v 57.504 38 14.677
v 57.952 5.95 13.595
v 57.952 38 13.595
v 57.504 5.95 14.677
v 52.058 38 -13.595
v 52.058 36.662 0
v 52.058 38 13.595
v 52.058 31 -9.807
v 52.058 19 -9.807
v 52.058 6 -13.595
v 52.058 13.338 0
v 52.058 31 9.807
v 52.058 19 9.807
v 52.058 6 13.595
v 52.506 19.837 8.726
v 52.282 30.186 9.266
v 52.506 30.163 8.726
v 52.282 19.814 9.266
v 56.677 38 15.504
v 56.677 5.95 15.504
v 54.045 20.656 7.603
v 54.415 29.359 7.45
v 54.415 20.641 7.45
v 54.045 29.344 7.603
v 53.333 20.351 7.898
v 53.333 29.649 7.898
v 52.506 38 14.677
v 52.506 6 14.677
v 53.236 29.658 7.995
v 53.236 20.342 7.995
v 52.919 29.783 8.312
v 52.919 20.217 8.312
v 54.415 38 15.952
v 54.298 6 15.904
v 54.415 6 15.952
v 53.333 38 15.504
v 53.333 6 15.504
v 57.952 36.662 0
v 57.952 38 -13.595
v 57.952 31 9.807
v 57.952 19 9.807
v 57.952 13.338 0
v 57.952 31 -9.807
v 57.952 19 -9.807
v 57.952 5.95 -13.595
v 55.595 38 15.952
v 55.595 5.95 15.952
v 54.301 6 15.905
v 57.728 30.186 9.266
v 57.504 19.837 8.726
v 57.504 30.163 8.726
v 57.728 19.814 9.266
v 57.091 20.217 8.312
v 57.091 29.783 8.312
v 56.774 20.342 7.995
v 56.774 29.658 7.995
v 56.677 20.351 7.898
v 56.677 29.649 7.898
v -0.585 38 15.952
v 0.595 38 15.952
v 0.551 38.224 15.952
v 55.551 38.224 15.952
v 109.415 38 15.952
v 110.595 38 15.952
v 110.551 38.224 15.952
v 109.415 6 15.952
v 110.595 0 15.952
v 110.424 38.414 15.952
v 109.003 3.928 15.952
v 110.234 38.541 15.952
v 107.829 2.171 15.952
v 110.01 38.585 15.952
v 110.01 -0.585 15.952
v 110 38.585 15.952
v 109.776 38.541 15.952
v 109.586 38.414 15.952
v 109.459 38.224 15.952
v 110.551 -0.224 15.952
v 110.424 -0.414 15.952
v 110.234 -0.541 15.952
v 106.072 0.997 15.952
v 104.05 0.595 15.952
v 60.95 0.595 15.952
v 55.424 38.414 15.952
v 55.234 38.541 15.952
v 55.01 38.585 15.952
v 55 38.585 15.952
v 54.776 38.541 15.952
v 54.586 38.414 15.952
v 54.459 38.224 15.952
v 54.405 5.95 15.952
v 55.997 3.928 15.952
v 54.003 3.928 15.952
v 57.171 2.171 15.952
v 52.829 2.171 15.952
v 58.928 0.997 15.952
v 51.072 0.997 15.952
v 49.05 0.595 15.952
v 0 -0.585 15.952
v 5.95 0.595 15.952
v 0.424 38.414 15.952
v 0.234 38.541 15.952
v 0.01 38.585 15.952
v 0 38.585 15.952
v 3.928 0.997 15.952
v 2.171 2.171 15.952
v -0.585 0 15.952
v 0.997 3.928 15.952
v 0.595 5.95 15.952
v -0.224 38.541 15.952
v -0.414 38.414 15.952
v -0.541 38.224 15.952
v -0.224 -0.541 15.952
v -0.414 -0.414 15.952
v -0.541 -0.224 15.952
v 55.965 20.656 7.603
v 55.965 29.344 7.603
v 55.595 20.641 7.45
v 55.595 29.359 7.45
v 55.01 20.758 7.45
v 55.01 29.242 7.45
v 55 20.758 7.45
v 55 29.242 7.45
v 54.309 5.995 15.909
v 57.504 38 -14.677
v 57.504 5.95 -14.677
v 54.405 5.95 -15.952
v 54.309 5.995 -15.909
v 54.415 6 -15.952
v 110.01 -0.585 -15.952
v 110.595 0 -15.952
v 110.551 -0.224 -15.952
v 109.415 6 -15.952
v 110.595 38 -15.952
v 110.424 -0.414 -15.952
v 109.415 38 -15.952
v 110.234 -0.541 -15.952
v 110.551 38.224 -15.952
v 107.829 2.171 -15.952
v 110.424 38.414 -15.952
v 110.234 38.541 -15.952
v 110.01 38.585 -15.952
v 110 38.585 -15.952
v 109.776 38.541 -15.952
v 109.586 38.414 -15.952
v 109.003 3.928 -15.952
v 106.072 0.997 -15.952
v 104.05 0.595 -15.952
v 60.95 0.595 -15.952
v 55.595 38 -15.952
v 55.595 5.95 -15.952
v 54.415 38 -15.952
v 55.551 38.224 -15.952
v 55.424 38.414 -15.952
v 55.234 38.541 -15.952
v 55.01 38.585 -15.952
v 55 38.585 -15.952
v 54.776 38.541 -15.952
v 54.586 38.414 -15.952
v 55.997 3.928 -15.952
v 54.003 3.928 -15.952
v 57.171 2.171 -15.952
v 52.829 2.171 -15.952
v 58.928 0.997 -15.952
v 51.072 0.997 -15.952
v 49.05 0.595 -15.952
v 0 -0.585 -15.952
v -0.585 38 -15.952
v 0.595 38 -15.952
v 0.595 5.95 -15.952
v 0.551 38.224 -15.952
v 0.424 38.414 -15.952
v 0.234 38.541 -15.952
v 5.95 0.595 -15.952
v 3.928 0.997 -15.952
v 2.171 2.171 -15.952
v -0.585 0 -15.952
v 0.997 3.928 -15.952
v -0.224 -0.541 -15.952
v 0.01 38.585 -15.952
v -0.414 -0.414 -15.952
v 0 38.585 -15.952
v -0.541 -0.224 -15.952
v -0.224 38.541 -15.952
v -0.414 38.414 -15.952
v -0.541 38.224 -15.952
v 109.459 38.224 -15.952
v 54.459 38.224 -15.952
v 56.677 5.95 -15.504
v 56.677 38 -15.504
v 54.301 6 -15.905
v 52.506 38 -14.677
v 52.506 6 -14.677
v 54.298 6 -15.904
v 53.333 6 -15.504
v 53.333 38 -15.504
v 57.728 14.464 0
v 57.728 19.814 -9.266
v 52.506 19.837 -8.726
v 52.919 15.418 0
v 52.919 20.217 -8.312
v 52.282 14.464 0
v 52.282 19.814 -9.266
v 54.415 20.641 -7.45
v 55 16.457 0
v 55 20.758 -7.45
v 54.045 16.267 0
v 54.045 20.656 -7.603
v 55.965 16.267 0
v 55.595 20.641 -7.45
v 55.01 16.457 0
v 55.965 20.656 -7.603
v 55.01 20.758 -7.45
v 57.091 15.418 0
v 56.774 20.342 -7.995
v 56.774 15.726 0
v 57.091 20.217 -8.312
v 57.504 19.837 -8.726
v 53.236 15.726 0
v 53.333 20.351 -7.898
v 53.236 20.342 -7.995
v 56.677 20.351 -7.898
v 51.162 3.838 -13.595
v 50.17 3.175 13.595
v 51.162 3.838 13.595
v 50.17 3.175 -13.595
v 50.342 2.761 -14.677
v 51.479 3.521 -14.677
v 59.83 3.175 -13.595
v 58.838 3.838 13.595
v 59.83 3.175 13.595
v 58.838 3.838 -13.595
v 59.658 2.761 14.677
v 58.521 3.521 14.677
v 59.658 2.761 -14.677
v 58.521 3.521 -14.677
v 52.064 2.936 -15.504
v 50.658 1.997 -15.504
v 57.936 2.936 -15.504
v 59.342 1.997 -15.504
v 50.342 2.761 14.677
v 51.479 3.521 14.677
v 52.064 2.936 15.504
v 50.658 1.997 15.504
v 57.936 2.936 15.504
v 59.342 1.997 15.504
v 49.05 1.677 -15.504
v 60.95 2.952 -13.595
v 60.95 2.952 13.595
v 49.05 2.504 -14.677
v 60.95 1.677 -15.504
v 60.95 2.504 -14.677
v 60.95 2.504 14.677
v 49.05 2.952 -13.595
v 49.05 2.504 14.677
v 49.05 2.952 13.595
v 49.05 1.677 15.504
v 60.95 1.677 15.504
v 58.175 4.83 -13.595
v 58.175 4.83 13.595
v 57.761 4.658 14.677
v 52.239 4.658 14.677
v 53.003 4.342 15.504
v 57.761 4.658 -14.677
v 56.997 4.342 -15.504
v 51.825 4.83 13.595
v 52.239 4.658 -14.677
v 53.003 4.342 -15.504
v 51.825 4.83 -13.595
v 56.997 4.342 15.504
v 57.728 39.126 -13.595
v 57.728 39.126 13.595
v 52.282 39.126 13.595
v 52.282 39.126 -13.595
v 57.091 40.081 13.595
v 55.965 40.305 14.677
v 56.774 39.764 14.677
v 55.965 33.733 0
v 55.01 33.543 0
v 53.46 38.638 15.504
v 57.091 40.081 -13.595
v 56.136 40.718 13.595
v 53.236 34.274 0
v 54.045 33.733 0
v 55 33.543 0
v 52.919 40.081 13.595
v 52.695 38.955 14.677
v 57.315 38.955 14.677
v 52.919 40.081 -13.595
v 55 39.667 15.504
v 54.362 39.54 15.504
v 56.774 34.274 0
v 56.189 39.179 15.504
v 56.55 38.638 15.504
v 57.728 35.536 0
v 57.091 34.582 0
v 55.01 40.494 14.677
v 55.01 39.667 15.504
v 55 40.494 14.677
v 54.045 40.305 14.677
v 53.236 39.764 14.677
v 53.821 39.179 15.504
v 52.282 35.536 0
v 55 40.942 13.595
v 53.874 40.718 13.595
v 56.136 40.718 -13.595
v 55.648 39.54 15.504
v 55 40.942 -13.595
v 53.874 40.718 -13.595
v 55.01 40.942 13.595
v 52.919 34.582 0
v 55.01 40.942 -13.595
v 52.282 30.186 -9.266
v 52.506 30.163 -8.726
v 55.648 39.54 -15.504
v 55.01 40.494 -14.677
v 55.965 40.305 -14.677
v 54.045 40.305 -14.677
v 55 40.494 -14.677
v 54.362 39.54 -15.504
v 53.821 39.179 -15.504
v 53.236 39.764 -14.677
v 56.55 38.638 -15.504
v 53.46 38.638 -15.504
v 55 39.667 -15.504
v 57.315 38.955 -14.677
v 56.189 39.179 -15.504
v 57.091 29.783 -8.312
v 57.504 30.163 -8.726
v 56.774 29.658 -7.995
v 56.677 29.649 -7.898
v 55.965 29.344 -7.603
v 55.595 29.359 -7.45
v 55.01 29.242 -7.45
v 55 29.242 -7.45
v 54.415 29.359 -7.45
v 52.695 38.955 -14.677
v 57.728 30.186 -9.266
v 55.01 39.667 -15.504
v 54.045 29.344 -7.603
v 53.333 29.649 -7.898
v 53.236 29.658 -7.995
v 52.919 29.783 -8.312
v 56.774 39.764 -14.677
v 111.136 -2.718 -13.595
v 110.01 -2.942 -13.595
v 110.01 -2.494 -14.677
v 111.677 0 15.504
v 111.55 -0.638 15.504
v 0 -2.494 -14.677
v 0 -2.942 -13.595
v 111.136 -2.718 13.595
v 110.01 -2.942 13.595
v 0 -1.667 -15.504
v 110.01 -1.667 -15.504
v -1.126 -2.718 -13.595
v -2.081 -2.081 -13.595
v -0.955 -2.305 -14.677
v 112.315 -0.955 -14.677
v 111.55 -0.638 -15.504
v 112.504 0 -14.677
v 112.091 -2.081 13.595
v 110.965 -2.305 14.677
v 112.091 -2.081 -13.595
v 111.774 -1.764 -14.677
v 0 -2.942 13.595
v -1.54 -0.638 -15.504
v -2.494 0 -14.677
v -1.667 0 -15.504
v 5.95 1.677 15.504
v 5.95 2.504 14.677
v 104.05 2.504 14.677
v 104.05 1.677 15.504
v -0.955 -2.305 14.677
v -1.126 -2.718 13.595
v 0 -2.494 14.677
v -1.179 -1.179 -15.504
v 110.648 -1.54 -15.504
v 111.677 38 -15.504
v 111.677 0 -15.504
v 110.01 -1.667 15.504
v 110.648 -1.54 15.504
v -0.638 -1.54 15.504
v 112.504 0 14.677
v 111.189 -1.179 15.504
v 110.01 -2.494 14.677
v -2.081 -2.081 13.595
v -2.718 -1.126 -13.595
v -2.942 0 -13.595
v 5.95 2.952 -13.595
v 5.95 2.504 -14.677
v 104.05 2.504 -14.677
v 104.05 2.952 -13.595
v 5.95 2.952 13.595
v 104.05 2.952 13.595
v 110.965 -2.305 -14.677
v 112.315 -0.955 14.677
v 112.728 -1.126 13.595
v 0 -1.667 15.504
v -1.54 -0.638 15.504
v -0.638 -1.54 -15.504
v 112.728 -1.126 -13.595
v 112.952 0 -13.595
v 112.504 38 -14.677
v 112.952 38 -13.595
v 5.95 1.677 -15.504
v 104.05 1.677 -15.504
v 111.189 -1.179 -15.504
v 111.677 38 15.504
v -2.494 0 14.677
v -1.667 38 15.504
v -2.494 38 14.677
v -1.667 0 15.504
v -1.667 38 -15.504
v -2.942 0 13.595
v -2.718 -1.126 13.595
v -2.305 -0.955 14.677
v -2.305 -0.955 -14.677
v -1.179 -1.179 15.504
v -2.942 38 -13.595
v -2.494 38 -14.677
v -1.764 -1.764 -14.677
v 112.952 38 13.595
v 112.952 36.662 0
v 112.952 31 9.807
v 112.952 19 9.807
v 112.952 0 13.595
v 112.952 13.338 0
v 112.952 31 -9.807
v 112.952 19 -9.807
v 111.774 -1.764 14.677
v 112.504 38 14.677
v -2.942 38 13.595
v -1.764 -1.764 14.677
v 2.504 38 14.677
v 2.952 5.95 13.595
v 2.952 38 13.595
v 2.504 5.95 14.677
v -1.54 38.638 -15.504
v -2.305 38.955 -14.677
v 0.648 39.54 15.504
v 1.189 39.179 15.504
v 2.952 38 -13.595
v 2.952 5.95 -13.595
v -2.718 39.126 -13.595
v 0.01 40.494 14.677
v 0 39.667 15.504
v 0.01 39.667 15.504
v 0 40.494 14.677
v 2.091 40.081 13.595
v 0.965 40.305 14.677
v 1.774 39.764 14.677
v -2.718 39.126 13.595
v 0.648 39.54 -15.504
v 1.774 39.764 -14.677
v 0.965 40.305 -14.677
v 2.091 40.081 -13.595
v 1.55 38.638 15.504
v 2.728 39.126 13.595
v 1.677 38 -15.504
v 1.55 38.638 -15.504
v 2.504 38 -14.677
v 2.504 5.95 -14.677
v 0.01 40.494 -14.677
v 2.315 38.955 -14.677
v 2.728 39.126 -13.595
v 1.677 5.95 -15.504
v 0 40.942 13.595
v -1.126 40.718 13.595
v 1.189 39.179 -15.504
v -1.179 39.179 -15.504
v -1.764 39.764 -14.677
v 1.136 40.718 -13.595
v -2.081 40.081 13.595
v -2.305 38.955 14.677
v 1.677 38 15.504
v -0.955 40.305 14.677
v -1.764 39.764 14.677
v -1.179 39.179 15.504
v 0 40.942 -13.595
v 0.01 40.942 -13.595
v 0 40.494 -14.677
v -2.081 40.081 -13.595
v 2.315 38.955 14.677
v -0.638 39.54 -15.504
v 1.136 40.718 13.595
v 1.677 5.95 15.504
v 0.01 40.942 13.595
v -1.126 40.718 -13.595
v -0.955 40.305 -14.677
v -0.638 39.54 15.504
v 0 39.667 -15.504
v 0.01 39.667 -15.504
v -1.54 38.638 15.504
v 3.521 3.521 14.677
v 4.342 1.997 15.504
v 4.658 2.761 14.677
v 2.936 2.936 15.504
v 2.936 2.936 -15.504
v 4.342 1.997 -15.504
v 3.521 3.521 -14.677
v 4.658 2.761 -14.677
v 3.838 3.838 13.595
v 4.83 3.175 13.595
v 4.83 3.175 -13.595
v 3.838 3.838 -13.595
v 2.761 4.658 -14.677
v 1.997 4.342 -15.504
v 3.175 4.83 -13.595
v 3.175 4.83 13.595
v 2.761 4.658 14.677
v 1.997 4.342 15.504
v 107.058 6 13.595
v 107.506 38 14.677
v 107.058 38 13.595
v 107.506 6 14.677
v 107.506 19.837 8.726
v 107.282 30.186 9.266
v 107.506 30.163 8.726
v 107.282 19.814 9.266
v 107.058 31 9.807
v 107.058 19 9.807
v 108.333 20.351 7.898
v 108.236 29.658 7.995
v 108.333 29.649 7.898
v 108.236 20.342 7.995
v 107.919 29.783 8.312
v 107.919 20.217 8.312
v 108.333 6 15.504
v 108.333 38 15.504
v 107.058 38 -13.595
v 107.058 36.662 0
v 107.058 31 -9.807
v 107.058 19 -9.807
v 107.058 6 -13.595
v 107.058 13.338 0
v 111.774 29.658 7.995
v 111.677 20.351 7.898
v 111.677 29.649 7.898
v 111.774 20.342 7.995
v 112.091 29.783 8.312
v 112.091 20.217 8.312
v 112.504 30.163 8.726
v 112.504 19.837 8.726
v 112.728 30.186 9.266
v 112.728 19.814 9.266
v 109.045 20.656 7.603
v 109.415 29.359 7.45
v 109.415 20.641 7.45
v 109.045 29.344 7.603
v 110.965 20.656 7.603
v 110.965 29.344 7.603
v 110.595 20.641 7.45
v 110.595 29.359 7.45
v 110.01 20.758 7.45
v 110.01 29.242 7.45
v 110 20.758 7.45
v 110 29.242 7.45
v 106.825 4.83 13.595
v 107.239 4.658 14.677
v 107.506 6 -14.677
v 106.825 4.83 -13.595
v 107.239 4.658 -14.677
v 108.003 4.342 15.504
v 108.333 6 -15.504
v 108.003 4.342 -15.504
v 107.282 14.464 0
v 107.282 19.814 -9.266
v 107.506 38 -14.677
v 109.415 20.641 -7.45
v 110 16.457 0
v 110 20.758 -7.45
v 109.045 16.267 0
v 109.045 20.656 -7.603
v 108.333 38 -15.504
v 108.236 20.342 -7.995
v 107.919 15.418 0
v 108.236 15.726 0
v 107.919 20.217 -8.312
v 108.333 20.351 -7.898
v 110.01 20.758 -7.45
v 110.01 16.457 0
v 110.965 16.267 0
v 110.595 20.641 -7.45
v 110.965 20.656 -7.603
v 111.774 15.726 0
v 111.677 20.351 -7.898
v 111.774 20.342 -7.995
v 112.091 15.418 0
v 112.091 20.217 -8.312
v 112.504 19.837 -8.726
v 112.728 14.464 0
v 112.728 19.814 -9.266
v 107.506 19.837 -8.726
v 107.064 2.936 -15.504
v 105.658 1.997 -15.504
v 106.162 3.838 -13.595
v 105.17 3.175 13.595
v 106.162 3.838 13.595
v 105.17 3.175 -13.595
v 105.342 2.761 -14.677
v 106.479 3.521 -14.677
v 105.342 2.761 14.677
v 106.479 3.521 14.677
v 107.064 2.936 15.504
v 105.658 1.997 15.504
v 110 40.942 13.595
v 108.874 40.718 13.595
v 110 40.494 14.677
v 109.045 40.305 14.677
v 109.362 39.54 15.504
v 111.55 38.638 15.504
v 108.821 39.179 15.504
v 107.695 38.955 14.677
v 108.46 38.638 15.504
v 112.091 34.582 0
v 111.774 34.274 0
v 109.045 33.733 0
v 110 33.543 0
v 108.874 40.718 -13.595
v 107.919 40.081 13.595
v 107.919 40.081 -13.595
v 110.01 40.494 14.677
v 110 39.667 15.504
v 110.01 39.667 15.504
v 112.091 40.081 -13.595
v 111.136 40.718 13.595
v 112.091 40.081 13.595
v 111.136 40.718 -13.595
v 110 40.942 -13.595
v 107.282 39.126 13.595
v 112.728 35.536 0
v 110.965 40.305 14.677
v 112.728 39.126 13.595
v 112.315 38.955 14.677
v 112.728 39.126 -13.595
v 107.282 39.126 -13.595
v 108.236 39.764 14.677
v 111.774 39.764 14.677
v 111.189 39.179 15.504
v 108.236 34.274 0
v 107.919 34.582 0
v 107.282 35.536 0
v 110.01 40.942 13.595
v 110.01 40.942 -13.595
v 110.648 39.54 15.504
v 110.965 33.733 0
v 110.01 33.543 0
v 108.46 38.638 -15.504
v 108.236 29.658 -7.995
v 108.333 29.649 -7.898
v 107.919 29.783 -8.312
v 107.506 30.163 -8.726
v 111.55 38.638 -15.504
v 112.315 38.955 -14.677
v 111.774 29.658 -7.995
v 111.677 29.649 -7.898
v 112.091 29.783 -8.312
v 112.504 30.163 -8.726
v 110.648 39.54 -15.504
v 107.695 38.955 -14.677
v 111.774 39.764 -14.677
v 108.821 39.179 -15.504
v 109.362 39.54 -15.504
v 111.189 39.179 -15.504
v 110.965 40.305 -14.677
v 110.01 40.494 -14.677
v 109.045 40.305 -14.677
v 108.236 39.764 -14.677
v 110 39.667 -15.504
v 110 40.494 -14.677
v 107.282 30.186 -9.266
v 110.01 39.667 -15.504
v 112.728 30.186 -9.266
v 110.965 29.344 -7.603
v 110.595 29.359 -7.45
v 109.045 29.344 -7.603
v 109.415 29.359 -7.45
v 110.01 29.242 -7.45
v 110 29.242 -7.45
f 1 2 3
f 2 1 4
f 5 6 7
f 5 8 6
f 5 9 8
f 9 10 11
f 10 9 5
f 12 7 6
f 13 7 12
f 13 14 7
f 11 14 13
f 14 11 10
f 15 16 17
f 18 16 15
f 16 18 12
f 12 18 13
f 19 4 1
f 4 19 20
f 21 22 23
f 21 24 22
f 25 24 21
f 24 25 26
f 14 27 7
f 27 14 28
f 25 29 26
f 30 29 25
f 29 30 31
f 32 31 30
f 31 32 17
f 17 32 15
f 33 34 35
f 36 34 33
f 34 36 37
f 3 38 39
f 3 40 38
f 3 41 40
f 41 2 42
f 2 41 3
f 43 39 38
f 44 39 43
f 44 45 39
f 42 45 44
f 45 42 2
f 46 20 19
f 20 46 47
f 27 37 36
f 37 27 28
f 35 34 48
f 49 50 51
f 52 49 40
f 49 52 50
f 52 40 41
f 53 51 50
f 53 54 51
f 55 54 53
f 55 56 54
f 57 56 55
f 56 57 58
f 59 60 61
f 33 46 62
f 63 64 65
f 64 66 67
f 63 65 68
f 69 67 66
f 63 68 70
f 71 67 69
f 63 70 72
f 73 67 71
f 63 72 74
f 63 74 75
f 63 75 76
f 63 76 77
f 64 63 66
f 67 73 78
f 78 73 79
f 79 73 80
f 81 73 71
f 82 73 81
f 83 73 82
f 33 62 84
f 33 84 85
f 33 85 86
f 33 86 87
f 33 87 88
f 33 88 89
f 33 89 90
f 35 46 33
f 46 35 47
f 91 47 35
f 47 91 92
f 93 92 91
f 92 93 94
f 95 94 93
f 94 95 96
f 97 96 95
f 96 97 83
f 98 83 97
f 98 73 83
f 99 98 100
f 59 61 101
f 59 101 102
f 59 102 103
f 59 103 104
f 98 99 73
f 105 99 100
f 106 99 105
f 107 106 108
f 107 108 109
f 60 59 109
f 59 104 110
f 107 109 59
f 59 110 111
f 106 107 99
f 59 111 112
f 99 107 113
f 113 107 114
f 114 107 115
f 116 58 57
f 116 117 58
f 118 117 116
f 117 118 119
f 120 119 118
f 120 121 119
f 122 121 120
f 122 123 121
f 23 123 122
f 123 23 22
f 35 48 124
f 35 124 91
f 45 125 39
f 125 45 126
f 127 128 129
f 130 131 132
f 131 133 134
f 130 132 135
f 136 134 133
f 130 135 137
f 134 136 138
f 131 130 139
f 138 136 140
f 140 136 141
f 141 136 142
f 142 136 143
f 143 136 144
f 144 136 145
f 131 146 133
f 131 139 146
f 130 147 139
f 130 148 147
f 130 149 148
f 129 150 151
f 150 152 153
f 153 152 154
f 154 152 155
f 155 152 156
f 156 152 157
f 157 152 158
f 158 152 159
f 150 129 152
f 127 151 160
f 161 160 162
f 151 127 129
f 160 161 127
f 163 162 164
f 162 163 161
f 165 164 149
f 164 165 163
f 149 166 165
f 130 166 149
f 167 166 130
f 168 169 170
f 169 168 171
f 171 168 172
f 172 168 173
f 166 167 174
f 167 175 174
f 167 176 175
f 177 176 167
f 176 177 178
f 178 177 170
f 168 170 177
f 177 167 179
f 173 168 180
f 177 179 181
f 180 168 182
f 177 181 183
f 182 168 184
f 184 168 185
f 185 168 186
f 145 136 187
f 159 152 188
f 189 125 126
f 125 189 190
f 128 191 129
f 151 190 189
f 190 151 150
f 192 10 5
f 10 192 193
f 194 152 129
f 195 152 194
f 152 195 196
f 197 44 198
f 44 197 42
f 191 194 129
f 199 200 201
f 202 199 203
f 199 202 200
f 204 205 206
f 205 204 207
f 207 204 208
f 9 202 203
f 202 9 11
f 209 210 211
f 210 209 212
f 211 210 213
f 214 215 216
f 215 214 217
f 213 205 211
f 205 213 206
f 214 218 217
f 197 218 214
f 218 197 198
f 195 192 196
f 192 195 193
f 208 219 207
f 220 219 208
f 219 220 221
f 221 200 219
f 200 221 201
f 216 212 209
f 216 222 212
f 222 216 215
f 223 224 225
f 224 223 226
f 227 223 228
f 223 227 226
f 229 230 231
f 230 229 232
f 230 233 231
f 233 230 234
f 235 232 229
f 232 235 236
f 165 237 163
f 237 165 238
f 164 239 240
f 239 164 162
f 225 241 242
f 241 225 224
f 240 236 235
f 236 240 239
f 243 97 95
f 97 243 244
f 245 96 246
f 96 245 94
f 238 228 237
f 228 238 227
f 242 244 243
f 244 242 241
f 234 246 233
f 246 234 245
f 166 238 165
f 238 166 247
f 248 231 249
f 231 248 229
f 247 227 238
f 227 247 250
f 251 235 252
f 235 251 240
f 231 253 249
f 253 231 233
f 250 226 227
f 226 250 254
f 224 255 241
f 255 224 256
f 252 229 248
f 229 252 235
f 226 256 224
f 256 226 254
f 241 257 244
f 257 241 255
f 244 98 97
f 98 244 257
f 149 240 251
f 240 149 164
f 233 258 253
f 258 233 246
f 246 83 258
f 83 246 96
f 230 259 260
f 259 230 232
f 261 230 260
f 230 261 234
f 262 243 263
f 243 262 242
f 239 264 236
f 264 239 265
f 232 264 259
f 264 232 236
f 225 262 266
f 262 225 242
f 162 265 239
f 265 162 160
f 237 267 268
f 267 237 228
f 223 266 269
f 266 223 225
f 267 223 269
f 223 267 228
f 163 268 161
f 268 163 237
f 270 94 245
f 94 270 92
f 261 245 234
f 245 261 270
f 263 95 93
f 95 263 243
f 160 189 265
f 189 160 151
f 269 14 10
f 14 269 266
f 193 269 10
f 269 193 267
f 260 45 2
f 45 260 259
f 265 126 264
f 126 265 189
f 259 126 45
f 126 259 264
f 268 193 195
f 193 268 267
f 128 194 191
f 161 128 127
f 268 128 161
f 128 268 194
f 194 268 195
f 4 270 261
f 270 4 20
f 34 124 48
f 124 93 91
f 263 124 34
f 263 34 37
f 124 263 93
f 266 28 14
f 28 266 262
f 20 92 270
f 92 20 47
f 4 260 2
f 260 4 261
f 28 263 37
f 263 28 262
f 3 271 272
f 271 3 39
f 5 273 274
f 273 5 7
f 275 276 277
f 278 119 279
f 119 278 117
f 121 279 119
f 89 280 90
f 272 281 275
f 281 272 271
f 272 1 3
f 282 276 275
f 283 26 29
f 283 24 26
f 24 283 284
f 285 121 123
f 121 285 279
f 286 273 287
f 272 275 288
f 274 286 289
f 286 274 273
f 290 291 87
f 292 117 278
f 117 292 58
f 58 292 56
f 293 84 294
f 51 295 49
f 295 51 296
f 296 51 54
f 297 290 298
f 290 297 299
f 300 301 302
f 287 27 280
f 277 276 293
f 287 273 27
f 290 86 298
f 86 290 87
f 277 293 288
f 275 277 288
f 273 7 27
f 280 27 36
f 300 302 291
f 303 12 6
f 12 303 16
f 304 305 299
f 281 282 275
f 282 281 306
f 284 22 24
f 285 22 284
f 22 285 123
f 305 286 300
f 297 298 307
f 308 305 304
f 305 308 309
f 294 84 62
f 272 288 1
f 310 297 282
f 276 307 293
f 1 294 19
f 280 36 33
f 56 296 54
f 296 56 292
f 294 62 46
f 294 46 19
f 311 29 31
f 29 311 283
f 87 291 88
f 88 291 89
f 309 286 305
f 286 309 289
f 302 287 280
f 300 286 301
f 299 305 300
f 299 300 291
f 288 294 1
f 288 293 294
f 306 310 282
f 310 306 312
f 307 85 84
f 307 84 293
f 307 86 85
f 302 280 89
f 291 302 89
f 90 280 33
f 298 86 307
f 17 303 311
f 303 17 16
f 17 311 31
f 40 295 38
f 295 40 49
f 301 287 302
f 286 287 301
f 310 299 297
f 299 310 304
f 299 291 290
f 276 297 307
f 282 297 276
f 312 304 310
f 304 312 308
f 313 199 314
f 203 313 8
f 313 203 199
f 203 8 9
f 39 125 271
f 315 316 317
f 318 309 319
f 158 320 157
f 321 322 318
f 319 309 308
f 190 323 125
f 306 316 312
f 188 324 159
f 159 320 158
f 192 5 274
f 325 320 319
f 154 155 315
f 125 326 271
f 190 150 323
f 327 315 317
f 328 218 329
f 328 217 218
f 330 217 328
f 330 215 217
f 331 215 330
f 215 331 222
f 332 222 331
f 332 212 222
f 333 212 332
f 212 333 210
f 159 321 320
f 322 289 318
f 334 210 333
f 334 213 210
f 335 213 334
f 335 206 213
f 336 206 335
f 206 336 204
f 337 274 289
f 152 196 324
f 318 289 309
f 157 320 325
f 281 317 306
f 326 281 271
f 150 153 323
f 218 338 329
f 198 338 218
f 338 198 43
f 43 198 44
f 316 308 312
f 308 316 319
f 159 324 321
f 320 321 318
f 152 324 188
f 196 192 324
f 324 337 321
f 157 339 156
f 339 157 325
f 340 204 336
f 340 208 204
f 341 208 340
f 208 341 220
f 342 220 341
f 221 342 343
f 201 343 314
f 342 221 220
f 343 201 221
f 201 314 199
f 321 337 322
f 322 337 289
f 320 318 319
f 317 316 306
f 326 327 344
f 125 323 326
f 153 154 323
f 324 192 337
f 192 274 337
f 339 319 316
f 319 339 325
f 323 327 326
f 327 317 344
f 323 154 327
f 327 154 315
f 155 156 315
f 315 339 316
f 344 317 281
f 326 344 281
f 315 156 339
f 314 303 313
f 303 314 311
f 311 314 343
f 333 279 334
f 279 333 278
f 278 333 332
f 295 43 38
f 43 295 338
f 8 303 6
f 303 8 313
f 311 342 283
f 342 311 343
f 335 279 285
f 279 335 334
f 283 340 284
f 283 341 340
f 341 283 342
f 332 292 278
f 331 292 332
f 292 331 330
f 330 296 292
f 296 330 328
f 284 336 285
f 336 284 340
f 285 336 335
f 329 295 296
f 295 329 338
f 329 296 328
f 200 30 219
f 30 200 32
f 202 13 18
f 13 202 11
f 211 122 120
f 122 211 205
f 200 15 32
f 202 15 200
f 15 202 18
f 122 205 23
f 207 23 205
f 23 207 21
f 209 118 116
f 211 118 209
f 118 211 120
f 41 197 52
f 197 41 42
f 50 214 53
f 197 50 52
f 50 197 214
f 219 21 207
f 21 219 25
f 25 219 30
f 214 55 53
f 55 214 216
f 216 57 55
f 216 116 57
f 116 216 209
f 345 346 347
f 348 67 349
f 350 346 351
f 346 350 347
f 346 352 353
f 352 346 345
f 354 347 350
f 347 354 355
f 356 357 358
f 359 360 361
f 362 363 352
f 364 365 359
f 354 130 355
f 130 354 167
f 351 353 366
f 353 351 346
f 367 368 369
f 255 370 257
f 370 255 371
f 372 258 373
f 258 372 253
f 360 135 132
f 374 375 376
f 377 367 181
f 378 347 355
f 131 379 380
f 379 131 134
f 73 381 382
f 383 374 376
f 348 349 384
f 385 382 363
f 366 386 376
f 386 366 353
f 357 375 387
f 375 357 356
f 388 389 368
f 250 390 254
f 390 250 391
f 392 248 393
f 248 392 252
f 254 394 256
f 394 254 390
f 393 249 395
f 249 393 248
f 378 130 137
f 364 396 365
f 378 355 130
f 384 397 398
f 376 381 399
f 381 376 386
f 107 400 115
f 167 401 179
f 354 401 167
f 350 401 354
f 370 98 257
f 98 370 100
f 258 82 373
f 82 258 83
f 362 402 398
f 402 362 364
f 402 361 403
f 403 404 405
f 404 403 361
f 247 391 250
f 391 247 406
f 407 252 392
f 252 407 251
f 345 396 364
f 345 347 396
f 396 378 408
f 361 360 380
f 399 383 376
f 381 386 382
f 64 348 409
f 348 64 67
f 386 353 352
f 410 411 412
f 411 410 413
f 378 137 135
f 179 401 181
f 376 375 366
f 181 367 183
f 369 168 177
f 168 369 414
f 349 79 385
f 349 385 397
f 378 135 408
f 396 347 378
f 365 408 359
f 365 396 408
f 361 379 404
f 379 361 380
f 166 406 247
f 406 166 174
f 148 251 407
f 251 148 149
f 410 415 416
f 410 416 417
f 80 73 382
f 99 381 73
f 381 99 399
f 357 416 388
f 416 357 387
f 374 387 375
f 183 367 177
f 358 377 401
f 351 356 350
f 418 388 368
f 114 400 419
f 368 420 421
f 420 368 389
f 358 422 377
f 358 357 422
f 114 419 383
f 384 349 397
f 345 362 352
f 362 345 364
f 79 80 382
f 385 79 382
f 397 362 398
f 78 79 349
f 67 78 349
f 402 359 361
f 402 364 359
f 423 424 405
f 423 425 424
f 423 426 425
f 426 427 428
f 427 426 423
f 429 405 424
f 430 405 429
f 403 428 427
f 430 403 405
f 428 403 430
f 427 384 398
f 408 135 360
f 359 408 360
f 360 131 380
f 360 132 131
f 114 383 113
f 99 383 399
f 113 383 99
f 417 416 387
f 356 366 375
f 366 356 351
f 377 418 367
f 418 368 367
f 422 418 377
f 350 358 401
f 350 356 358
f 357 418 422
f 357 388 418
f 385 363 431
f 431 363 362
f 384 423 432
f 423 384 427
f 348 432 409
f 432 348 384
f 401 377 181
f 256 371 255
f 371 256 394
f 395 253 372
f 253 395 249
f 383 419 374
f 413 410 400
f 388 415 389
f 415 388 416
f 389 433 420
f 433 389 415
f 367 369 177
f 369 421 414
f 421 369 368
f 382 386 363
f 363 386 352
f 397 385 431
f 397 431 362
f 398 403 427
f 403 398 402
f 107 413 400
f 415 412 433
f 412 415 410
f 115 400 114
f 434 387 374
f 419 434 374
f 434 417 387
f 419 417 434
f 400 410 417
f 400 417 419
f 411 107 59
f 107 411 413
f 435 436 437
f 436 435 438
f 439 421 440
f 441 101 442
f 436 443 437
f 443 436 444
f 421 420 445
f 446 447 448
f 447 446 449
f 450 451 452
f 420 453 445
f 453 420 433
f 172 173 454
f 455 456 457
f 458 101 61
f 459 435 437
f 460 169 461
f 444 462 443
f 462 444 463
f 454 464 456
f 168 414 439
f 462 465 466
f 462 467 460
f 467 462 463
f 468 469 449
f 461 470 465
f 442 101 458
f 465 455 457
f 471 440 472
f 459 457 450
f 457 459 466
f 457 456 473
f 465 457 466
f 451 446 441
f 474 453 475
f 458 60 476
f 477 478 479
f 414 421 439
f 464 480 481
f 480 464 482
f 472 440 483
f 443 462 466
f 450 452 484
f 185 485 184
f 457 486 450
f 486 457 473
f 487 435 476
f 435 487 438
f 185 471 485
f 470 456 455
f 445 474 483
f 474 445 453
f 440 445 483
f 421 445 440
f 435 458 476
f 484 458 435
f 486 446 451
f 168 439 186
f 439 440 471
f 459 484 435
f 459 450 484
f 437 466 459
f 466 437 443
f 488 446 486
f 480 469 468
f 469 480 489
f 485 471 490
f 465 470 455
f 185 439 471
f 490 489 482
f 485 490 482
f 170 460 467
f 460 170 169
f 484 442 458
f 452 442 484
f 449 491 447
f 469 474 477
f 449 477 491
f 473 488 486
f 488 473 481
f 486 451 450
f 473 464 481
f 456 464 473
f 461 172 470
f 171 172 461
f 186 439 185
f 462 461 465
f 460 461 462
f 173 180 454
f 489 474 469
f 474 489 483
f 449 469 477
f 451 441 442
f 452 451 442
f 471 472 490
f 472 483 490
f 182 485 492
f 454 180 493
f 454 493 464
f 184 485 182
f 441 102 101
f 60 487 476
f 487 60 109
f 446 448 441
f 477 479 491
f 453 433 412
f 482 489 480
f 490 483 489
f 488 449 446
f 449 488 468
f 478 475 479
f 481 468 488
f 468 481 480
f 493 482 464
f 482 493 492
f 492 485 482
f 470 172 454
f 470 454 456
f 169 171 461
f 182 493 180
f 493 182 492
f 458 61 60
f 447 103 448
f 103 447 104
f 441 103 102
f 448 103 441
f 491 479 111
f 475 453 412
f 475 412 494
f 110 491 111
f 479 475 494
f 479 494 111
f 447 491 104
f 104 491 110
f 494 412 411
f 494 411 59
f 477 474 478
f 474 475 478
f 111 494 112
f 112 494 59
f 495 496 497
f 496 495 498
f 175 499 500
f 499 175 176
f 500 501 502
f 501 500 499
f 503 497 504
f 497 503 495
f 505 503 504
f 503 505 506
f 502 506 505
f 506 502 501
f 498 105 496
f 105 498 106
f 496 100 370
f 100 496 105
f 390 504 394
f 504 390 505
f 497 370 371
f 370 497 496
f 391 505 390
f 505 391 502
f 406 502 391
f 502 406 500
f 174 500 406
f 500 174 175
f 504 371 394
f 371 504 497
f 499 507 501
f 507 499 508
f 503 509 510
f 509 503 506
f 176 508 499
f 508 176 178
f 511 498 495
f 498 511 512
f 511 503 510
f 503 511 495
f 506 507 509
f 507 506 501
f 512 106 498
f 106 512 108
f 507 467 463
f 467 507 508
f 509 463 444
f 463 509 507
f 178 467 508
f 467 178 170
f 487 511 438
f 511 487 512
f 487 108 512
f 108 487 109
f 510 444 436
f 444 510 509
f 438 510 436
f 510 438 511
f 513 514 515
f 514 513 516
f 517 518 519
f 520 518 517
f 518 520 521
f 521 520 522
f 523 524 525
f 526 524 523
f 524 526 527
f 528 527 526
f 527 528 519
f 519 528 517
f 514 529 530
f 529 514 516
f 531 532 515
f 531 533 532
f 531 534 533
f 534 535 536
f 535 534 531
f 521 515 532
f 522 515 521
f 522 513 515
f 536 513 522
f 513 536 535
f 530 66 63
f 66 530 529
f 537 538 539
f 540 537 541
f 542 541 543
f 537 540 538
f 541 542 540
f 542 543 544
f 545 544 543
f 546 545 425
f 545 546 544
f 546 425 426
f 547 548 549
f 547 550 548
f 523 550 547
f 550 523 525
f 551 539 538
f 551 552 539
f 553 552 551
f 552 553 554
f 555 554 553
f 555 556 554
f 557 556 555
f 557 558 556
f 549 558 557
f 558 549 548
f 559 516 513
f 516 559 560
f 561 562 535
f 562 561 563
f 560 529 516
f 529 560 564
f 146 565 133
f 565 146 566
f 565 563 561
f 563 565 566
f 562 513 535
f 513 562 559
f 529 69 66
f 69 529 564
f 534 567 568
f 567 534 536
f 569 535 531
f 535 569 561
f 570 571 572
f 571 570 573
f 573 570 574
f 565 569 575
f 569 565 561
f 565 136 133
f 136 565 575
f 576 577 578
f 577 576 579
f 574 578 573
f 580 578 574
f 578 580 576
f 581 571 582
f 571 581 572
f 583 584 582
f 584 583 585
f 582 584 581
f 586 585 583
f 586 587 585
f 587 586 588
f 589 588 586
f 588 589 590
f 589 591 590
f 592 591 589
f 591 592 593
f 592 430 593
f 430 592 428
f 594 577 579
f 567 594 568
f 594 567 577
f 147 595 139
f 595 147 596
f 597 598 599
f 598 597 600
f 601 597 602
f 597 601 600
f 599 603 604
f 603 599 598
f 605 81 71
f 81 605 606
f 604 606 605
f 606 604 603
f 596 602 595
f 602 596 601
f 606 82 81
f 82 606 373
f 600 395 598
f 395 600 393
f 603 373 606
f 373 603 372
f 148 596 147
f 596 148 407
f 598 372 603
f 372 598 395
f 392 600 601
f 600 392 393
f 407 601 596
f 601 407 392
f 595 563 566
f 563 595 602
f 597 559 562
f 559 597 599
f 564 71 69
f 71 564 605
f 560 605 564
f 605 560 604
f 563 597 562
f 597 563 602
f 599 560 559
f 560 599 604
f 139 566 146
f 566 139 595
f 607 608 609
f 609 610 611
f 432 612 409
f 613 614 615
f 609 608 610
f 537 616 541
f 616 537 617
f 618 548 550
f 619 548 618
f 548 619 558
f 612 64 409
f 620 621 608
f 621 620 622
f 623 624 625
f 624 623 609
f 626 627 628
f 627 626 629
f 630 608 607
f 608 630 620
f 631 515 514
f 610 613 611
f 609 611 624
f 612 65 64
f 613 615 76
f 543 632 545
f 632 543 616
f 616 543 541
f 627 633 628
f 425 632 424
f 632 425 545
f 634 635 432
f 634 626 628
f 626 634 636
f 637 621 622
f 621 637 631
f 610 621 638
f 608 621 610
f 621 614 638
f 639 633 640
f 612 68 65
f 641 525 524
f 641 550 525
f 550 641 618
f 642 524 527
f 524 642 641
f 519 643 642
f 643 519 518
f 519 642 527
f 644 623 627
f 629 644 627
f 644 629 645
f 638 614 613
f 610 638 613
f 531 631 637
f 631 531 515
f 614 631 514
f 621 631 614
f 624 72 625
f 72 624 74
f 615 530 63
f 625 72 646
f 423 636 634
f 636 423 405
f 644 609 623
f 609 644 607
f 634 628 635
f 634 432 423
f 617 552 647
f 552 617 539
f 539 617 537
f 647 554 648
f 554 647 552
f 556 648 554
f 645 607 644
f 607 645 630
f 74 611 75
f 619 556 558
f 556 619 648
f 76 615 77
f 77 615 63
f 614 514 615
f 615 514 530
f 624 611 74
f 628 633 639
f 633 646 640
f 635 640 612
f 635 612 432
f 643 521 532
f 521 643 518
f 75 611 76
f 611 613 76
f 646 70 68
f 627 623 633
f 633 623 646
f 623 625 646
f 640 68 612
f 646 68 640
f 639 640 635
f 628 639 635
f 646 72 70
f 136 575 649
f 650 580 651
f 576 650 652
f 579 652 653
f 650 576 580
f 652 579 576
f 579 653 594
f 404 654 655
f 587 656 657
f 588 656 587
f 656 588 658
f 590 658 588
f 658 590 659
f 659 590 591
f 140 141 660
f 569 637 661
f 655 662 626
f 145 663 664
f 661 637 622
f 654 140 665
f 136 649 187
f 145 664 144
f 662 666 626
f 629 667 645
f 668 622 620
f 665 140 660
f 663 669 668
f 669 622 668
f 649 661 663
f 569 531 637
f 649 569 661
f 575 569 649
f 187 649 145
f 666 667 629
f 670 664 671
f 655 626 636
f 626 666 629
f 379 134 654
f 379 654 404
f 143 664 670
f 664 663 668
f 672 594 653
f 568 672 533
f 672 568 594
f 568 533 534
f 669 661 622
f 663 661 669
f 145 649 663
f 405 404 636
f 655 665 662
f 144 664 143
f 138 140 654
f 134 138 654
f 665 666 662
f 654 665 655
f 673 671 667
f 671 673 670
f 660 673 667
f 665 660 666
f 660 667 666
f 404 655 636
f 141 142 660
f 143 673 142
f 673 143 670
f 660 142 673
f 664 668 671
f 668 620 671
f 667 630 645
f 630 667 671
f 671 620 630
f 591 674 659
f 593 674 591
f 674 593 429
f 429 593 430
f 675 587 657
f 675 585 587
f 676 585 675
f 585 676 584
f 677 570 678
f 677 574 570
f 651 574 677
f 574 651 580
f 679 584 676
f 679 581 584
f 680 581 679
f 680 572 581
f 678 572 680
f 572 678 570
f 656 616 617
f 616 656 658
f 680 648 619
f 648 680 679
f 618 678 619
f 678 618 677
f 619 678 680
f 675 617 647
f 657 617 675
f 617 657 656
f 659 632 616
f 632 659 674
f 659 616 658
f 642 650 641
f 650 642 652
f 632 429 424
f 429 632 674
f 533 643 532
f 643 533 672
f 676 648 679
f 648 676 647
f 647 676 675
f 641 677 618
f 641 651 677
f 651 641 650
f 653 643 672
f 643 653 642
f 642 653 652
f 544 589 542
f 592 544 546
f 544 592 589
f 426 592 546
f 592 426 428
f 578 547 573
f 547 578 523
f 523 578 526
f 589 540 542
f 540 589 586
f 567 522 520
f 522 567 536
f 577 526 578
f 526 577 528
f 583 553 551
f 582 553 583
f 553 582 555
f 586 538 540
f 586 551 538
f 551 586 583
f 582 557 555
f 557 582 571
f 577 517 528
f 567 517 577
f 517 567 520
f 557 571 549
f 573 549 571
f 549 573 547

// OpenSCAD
// chosen dimensions
insertion_hole_d = 18;
insertion_height = 110;
clearance_d = 50;
rounding_radius = 3;
extra_width = 1;

epsilon = 0.01;
rr = rounding_radius;
rd = rounding_radius * 2;

// calculated
clearance_r = clearance_d / 2;
round_bar_d = rd + epsilon;
basic_width = insertion_hole_d + round_bar_d * 2 + extra_width * 2;
stickout = clearance_r + insertion_hole_d / 2 + rr + extra_width;

// Coordinate scheme: x = vertical as mounted, y = depth (perpendicular to wall), z = width

main();

module main() {
    minkowski() {
        sphere(r=rounding_radius, $fn=16);
        
        shrunk_geometry();
    }
}

module shrunk_geometry() {
    // back plate
    translate([0, 0, -(basic_width - rd) / 2])
    cube([insertion_height, epsilon, basic_width - rd]);
    
    // base
    translate([0, 0, -(basic_width - rd) / 2])
    cube([epsilon, stickout, basic_width - rd]);
    fillet();

    translate([insertion_height / 2, 0, 0]) {
        ring();
        fillet();
        scale([-1, 1, 1]) fillet();
    }
    translate([insertion_height, 0, 0]) {
        ring();
        scale([-1, 1, 1]) fillet();
    }
}

module ring() {
    difference() {
        translate([0, 0, -(basic_width - rd) / 2])
        cube([epsilon, stickout, basic_width - rd]);
        
        translate([0, clearance_d / 2, 0])
        rotate([0, 90, 0])
        rotate([0, 0, 90])
        cylinder(d=insertion_hole_d + rd, h=1000, center=true, $fn=6);
    }
}

//translate([0, 0, basic_width])
//fillet();
module fillet() {
    r = rd;
    h = basic_width - rd;
    rotate([0, 0, 180])
    translate([-r, -r, 0])
    difference() {
        translate([0, 0, -h / 2])
        cube([r, r, h]);
        cylinder(r=r, h=h + epsilon * 2, center=true, $fn=16);
    }
}
